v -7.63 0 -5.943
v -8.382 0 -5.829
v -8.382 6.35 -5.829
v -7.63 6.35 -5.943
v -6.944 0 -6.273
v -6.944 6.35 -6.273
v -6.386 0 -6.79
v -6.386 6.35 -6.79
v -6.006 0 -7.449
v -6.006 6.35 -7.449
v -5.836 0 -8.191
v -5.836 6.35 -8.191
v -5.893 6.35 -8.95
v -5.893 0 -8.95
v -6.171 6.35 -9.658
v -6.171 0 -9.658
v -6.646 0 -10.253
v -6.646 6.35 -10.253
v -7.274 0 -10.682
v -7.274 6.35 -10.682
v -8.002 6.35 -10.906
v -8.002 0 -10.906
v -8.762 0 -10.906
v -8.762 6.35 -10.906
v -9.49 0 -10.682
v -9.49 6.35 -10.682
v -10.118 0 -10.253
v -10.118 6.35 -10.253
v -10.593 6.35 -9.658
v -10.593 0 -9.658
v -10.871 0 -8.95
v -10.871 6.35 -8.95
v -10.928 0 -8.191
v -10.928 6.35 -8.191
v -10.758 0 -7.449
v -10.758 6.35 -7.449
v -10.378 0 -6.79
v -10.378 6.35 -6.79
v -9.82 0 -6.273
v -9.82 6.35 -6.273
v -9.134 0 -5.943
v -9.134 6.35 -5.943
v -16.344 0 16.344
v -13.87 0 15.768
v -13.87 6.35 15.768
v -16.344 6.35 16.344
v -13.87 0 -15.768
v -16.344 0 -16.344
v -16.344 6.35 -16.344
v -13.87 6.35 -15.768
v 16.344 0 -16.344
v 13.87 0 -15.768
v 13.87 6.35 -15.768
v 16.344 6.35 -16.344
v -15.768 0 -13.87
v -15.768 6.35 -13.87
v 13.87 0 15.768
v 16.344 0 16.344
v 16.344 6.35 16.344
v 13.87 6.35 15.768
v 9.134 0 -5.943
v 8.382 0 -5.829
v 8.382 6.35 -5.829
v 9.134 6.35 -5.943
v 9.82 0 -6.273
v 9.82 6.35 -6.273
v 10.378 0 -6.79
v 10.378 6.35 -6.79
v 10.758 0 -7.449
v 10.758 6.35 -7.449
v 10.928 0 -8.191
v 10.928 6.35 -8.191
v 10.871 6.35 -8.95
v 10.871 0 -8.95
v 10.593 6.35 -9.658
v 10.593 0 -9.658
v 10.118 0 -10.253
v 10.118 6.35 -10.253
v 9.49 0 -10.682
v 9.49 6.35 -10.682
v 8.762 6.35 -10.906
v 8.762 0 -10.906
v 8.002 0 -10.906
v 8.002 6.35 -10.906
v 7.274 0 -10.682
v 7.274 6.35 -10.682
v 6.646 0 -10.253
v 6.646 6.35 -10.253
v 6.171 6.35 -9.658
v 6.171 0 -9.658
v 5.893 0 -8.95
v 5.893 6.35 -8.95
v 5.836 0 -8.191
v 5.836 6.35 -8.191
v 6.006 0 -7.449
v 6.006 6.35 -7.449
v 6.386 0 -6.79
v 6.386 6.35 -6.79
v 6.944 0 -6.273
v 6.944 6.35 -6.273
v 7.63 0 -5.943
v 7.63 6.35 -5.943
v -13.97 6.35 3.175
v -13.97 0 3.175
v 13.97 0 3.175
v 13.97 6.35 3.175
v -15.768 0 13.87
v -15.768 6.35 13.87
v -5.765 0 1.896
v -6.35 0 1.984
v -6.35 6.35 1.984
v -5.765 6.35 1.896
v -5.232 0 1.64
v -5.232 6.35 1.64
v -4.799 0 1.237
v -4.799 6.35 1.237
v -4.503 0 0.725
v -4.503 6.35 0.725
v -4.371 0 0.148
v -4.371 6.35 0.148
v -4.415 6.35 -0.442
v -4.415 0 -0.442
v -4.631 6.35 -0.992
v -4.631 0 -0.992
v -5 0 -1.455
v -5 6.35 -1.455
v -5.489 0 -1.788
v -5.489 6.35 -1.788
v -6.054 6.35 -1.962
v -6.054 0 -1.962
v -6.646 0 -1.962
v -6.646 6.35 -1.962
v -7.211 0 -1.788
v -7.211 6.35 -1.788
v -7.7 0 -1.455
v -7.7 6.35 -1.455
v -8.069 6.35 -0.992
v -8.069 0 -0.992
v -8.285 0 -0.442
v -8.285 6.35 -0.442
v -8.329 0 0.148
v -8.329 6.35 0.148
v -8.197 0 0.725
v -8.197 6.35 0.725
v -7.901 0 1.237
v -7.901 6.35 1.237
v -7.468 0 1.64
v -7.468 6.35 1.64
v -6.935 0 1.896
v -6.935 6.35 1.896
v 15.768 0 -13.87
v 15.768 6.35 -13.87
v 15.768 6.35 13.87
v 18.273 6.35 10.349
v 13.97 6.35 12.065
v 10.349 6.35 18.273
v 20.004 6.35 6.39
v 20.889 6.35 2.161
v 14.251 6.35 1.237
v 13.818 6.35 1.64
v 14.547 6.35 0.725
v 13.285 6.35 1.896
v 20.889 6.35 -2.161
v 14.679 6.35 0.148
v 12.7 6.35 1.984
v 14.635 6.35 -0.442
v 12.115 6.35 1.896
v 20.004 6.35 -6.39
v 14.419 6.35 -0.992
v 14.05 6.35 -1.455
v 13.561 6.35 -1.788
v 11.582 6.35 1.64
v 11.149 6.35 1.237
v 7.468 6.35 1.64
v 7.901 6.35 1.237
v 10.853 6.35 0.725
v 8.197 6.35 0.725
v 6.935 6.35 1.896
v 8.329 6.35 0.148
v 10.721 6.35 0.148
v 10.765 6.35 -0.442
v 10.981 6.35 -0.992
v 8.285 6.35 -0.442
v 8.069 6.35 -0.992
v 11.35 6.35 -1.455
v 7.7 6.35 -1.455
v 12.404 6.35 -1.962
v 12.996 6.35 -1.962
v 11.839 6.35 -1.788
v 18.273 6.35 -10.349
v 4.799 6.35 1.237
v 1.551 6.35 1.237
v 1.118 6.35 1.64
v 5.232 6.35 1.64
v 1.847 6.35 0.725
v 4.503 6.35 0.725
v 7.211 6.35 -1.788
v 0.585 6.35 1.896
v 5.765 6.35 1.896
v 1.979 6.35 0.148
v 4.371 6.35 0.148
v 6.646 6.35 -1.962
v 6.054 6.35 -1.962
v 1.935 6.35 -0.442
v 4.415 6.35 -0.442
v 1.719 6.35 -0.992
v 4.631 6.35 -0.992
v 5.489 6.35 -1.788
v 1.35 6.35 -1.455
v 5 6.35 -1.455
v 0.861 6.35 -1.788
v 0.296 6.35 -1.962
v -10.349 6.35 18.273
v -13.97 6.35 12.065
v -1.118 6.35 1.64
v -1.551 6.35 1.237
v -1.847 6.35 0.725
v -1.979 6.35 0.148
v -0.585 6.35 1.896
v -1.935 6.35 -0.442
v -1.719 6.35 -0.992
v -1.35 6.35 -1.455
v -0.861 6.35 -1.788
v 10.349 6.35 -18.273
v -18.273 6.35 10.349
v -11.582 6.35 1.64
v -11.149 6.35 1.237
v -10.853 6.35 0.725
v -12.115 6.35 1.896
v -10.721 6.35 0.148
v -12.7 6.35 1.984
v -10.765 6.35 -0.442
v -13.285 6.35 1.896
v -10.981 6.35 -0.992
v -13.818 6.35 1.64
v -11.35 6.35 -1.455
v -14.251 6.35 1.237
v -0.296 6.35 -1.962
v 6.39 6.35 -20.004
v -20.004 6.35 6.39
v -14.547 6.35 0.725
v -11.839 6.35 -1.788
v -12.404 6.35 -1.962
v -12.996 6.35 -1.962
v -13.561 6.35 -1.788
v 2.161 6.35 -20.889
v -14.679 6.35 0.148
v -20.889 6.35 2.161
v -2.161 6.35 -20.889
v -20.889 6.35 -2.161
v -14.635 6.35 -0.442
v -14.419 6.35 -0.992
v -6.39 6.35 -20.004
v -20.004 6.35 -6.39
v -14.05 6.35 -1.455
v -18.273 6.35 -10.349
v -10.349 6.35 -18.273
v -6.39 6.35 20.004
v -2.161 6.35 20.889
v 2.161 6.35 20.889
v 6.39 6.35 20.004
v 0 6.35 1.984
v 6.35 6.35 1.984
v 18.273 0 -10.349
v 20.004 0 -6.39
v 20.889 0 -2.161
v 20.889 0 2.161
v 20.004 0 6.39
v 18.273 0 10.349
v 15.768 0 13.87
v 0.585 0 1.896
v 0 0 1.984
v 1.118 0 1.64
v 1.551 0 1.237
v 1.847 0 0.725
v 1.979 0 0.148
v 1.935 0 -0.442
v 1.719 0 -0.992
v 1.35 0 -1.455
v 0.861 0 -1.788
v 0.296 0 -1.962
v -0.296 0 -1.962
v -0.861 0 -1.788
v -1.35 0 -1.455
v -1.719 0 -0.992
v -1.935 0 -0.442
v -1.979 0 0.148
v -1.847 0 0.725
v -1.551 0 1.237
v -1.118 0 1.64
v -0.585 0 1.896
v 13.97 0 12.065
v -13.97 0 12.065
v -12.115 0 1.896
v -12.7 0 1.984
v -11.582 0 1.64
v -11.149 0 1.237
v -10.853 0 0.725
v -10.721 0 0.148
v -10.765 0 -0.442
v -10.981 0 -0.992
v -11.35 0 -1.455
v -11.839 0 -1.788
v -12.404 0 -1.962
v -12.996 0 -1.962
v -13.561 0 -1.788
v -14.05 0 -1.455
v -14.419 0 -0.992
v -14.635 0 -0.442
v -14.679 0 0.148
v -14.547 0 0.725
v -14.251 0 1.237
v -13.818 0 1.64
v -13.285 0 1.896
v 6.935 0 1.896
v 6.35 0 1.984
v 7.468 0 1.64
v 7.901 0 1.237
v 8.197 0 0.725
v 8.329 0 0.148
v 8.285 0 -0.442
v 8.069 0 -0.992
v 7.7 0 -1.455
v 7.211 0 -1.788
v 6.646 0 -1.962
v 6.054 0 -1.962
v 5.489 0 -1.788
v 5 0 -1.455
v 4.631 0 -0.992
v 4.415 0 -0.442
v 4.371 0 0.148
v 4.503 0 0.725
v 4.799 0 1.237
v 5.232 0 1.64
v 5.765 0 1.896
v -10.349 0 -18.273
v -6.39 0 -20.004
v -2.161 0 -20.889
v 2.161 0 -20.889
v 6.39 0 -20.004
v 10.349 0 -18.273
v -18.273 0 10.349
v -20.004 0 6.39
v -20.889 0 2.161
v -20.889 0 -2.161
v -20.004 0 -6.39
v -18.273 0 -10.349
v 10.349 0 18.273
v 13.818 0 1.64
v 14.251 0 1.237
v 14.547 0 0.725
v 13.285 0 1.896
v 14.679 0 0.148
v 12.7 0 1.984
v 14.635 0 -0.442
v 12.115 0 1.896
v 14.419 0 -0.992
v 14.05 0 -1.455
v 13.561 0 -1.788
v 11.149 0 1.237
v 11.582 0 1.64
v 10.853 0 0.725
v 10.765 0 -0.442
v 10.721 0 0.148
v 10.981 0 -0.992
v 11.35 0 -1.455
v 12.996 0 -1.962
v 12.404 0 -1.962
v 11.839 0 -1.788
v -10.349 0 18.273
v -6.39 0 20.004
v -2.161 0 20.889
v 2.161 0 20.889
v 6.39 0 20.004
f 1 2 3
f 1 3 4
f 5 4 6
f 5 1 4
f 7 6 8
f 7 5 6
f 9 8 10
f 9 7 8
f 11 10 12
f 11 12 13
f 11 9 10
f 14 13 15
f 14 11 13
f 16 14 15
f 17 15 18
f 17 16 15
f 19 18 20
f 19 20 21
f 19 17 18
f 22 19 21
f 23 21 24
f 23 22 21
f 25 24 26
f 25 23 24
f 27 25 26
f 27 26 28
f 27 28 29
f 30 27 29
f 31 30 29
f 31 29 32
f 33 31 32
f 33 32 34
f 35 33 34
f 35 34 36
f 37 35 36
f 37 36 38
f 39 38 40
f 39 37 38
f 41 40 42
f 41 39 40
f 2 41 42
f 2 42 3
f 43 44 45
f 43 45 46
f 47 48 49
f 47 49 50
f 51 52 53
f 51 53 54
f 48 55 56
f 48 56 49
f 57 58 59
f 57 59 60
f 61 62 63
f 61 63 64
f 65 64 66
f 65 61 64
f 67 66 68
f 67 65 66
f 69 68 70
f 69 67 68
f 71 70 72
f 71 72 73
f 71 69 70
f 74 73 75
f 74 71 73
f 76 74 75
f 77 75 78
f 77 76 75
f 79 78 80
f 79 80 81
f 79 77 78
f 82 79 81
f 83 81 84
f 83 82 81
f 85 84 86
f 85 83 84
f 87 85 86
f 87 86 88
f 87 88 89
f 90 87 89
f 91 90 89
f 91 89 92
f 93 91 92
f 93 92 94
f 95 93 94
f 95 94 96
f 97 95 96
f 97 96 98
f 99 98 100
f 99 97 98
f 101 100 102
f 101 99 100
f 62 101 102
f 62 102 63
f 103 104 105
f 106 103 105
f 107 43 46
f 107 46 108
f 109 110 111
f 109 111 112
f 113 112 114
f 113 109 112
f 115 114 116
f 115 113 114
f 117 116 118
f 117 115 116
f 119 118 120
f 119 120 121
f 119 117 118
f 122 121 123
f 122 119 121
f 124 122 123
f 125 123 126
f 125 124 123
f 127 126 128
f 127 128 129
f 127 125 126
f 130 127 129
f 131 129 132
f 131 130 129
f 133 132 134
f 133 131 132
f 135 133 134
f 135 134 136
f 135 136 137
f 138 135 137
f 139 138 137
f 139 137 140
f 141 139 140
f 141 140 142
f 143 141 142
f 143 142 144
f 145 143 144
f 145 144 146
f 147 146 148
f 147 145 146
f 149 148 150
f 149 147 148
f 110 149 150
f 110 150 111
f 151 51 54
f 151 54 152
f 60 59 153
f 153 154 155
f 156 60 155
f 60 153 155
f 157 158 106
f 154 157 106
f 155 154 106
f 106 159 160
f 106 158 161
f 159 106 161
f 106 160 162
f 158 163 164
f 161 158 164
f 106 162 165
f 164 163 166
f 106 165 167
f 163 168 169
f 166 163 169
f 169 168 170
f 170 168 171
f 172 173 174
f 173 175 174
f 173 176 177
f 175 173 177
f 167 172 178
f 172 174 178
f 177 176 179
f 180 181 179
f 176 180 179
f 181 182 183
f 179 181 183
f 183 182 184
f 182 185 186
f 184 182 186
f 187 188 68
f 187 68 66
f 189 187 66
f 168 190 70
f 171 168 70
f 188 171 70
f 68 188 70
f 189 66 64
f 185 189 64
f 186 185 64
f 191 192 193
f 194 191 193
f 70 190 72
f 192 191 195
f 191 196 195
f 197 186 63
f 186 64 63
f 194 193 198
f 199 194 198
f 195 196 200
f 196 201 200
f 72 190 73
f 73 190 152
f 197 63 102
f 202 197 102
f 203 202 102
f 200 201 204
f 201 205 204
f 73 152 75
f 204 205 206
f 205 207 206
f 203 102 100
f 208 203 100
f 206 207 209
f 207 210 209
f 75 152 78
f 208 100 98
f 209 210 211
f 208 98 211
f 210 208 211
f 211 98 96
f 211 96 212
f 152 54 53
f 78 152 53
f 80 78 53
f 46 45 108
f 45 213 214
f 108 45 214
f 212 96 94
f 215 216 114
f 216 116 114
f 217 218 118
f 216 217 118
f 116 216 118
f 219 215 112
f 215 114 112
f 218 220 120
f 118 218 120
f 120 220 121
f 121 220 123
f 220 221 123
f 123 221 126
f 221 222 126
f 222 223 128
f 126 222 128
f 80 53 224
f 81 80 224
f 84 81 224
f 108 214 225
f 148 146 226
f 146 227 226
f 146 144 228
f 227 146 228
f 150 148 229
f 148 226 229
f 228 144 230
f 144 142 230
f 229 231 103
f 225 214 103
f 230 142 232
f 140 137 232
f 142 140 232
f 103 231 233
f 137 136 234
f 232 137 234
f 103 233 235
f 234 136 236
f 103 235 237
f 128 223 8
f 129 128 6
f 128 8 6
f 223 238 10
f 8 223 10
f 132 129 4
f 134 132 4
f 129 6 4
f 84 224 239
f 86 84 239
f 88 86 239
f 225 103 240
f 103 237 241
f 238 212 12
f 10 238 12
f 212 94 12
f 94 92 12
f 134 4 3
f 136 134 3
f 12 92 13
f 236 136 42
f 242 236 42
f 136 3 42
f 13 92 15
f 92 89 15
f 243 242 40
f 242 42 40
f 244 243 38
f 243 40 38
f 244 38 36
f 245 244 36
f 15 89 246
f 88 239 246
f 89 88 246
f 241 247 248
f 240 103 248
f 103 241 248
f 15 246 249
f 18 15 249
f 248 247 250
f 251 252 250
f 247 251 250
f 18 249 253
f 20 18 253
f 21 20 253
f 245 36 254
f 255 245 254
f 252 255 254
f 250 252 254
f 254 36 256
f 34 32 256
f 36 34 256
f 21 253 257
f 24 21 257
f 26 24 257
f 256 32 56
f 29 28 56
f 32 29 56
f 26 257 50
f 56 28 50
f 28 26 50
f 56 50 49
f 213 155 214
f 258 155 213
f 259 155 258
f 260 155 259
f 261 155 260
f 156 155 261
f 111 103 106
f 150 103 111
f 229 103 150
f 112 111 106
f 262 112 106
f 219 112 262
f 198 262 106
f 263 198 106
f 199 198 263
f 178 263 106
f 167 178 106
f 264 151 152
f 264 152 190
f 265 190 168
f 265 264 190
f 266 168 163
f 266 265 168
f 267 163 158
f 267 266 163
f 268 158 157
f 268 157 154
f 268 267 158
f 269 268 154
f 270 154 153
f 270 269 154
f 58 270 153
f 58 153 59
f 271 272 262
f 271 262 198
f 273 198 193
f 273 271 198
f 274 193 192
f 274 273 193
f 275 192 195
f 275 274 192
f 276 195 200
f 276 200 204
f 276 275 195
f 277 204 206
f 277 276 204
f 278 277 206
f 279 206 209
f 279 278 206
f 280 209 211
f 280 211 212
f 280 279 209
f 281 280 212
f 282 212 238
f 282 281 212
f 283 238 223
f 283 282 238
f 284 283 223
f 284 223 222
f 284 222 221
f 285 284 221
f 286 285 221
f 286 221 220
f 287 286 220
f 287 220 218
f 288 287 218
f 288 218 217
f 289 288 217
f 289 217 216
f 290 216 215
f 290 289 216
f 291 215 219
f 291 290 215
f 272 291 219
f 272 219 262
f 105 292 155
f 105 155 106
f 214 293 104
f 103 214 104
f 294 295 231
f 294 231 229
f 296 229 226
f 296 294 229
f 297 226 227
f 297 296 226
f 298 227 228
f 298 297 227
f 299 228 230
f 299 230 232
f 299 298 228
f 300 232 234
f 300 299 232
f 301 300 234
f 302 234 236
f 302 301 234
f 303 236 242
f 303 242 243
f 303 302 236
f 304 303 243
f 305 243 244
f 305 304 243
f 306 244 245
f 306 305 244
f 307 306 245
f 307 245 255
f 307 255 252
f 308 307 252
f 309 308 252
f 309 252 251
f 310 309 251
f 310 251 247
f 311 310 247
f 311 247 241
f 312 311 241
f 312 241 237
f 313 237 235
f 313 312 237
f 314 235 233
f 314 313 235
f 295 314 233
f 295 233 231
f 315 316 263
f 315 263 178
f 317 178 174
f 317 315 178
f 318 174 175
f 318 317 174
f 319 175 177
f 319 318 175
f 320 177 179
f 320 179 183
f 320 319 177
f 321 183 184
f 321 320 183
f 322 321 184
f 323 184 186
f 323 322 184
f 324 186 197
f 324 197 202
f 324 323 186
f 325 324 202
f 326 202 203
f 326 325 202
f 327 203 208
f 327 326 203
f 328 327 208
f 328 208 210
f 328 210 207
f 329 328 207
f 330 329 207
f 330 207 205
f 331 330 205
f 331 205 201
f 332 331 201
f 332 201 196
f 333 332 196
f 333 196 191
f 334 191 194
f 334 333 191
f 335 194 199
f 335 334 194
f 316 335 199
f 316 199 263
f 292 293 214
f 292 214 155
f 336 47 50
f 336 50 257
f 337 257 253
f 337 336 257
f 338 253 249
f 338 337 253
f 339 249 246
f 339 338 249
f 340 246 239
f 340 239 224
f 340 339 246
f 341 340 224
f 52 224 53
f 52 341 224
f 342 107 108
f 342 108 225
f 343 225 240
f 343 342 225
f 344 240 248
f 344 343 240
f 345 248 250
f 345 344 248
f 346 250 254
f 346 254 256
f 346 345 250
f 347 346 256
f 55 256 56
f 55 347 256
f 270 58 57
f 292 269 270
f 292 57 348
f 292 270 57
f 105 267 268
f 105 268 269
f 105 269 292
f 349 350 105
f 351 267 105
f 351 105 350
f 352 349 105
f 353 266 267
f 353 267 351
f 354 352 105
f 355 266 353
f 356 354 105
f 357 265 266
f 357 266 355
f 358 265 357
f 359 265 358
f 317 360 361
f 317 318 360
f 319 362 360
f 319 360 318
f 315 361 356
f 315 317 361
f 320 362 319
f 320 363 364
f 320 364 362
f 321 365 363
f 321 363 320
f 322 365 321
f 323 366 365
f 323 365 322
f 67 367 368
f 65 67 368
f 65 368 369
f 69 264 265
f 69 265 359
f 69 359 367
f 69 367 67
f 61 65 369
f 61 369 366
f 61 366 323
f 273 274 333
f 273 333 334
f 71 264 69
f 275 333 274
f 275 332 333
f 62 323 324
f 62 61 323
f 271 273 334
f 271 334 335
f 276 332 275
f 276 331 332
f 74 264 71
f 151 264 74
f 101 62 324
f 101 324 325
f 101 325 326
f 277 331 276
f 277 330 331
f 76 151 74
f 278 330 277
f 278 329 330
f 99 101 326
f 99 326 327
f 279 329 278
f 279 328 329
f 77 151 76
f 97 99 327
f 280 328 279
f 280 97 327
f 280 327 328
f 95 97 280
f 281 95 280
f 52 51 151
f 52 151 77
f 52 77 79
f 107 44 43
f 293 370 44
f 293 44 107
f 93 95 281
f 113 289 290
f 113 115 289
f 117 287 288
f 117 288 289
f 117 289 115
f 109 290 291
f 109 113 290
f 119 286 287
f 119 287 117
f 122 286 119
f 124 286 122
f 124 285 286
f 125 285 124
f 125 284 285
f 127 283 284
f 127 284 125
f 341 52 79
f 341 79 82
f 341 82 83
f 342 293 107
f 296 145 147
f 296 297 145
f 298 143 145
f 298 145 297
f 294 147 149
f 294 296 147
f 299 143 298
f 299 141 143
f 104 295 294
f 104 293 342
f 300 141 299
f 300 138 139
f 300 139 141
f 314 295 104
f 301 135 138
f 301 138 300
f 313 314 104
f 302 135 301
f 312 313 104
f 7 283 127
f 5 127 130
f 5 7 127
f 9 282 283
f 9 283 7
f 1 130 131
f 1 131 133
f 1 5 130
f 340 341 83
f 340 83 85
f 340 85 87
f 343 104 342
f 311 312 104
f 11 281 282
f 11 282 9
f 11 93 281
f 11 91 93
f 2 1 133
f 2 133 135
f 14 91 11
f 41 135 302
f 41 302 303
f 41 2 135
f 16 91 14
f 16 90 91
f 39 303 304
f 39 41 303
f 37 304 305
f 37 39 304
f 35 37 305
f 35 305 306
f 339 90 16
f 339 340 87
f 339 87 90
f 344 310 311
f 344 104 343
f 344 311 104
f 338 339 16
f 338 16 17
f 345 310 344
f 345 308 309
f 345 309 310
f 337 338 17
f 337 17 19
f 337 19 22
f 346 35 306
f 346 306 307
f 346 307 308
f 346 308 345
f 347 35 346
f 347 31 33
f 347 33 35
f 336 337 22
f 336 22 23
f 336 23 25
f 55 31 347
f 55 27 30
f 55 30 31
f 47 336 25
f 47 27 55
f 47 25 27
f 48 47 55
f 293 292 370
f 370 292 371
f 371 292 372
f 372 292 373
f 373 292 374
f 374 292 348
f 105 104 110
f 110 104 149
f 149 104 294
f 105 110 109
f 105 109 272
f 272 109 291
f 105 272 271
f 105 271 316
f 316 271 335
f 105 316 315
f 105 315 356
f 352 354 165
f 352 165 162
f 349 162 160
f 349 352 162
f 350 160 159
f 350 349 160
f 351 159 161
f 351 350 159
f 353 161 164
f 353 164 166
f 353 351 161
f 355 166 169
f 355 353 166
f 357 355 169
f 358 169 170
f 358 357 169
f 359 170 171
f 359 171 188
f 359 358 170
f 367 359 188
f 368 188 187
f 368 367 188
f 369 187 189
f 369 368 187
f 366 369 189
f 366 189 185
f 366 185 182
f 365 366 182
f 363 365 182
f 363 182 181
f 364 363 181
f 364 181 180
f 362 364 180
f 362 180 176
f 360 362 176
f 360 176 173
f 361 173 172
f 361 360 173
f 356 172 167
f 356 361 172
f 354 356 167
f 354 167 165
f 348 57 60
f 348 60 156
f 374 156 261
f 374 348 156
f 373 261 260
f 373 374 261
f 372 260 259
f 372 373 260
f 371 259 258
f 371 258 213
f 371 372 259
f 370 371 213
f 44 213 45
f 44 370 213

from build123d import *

# Parameters (mm, degrees)
SKETCH1_R           = 1.984375
SKETCH1_R_2         = 2.5527
SKETCH1_W           = 27.94
SKETCH1_H           = 8.89
BOSS_EXTRUDE1_DEPTH = 6.35


with BuildPart() as part:
    # Sketch1 → Boss-Extrude1 (new body)
    with BuildSketch(Plane(origin=(0, 0, 0), x_dir=(1, 0, 0), z_dir=(0, 1, 0))):
        with BuildLine():
            Line((13.870085237, 15.767711804), (16.343875029, 16.343875029))
            Line((16.343875029, 16.343875029), (15.767711804, 13.870085237))
            ThreePointArc((15.767711804, 13.870085237), (21, 0), (15.767711804, -13.870085237))
            Line((15.767711804, -13.870085237), (16.343875029, -16.343875029))
            Line((16.343875029, -16.343875029), (13.870085237, -15.767711804))
            ThreePointArc((13.870085237, -15.767711804), (0, -21), (-13.870085237, -15.767711804))
            Line((-13.870085237, -15.767711804), (-16.343875029, -16.343875029))
            Line((-16.343875029, -16.343875029), (-15.767711804, -13.870085237))
            ThreePointArc((-15.767711804, -13.870085237), (-21, 0), (-15.767711804, 13.870085237))
            Line((-15.767711804, 13.870085237), (-16.343875029, 16.343875029))
            Line((-16.343875029, 16.343875029), (-13.870085237, 15.767711804))
            ThreePointArc((-13.870085237, 15.767711804), (0, 21), (13.870085237, 15.767711804))
        make_face()
        with Locations(Location((-12.7, 0, 0), (0, 0, 270))):
            Circle(SKETCH1_R, mode=Mode.SUBTRACT)
        with Locations(Location((-6.35, 0, 0), (0, 0, 270))):
            Circle(SKETCH1_R, mode=Mode.SUBTRACT)
        with Locations(Location((0, 0, 0), (0, 0, 270))):
            Circle(SKETCH1_R, mode=Mode.SUBTRACT)
        with Locations(Location((-8.382, 8.382, 0), (0, 0, 270))):
            Circle(SKETCH1_R_2, mode=Mode.SUBTRACT)
        with Locations(Location((8.382, 8.382, 0), (0, 0, 270))):
            Circle(SKETCH1_R_2, mode=Mode.SUBTRACT)
        with Locations(Location((6.35, 0, 0), (0, 0, 270))):
            Circle(SKETCH1_R, mode=Mode.SUBTRACT)
        with Locations(Location((12.7, 0, 0), (0, 0, 270))):
            Circle(SKETCH1_R, mode=Mode.SUBTRACT)
        with Locations((0, -7.62)):
            Rectangle(SKETCH1_W, SKETCH1_H, mode=Mode.SUBTRACT)
    extrude(amount=BOSS_EXTRUDE1_DEPTH)


solid = part.part
